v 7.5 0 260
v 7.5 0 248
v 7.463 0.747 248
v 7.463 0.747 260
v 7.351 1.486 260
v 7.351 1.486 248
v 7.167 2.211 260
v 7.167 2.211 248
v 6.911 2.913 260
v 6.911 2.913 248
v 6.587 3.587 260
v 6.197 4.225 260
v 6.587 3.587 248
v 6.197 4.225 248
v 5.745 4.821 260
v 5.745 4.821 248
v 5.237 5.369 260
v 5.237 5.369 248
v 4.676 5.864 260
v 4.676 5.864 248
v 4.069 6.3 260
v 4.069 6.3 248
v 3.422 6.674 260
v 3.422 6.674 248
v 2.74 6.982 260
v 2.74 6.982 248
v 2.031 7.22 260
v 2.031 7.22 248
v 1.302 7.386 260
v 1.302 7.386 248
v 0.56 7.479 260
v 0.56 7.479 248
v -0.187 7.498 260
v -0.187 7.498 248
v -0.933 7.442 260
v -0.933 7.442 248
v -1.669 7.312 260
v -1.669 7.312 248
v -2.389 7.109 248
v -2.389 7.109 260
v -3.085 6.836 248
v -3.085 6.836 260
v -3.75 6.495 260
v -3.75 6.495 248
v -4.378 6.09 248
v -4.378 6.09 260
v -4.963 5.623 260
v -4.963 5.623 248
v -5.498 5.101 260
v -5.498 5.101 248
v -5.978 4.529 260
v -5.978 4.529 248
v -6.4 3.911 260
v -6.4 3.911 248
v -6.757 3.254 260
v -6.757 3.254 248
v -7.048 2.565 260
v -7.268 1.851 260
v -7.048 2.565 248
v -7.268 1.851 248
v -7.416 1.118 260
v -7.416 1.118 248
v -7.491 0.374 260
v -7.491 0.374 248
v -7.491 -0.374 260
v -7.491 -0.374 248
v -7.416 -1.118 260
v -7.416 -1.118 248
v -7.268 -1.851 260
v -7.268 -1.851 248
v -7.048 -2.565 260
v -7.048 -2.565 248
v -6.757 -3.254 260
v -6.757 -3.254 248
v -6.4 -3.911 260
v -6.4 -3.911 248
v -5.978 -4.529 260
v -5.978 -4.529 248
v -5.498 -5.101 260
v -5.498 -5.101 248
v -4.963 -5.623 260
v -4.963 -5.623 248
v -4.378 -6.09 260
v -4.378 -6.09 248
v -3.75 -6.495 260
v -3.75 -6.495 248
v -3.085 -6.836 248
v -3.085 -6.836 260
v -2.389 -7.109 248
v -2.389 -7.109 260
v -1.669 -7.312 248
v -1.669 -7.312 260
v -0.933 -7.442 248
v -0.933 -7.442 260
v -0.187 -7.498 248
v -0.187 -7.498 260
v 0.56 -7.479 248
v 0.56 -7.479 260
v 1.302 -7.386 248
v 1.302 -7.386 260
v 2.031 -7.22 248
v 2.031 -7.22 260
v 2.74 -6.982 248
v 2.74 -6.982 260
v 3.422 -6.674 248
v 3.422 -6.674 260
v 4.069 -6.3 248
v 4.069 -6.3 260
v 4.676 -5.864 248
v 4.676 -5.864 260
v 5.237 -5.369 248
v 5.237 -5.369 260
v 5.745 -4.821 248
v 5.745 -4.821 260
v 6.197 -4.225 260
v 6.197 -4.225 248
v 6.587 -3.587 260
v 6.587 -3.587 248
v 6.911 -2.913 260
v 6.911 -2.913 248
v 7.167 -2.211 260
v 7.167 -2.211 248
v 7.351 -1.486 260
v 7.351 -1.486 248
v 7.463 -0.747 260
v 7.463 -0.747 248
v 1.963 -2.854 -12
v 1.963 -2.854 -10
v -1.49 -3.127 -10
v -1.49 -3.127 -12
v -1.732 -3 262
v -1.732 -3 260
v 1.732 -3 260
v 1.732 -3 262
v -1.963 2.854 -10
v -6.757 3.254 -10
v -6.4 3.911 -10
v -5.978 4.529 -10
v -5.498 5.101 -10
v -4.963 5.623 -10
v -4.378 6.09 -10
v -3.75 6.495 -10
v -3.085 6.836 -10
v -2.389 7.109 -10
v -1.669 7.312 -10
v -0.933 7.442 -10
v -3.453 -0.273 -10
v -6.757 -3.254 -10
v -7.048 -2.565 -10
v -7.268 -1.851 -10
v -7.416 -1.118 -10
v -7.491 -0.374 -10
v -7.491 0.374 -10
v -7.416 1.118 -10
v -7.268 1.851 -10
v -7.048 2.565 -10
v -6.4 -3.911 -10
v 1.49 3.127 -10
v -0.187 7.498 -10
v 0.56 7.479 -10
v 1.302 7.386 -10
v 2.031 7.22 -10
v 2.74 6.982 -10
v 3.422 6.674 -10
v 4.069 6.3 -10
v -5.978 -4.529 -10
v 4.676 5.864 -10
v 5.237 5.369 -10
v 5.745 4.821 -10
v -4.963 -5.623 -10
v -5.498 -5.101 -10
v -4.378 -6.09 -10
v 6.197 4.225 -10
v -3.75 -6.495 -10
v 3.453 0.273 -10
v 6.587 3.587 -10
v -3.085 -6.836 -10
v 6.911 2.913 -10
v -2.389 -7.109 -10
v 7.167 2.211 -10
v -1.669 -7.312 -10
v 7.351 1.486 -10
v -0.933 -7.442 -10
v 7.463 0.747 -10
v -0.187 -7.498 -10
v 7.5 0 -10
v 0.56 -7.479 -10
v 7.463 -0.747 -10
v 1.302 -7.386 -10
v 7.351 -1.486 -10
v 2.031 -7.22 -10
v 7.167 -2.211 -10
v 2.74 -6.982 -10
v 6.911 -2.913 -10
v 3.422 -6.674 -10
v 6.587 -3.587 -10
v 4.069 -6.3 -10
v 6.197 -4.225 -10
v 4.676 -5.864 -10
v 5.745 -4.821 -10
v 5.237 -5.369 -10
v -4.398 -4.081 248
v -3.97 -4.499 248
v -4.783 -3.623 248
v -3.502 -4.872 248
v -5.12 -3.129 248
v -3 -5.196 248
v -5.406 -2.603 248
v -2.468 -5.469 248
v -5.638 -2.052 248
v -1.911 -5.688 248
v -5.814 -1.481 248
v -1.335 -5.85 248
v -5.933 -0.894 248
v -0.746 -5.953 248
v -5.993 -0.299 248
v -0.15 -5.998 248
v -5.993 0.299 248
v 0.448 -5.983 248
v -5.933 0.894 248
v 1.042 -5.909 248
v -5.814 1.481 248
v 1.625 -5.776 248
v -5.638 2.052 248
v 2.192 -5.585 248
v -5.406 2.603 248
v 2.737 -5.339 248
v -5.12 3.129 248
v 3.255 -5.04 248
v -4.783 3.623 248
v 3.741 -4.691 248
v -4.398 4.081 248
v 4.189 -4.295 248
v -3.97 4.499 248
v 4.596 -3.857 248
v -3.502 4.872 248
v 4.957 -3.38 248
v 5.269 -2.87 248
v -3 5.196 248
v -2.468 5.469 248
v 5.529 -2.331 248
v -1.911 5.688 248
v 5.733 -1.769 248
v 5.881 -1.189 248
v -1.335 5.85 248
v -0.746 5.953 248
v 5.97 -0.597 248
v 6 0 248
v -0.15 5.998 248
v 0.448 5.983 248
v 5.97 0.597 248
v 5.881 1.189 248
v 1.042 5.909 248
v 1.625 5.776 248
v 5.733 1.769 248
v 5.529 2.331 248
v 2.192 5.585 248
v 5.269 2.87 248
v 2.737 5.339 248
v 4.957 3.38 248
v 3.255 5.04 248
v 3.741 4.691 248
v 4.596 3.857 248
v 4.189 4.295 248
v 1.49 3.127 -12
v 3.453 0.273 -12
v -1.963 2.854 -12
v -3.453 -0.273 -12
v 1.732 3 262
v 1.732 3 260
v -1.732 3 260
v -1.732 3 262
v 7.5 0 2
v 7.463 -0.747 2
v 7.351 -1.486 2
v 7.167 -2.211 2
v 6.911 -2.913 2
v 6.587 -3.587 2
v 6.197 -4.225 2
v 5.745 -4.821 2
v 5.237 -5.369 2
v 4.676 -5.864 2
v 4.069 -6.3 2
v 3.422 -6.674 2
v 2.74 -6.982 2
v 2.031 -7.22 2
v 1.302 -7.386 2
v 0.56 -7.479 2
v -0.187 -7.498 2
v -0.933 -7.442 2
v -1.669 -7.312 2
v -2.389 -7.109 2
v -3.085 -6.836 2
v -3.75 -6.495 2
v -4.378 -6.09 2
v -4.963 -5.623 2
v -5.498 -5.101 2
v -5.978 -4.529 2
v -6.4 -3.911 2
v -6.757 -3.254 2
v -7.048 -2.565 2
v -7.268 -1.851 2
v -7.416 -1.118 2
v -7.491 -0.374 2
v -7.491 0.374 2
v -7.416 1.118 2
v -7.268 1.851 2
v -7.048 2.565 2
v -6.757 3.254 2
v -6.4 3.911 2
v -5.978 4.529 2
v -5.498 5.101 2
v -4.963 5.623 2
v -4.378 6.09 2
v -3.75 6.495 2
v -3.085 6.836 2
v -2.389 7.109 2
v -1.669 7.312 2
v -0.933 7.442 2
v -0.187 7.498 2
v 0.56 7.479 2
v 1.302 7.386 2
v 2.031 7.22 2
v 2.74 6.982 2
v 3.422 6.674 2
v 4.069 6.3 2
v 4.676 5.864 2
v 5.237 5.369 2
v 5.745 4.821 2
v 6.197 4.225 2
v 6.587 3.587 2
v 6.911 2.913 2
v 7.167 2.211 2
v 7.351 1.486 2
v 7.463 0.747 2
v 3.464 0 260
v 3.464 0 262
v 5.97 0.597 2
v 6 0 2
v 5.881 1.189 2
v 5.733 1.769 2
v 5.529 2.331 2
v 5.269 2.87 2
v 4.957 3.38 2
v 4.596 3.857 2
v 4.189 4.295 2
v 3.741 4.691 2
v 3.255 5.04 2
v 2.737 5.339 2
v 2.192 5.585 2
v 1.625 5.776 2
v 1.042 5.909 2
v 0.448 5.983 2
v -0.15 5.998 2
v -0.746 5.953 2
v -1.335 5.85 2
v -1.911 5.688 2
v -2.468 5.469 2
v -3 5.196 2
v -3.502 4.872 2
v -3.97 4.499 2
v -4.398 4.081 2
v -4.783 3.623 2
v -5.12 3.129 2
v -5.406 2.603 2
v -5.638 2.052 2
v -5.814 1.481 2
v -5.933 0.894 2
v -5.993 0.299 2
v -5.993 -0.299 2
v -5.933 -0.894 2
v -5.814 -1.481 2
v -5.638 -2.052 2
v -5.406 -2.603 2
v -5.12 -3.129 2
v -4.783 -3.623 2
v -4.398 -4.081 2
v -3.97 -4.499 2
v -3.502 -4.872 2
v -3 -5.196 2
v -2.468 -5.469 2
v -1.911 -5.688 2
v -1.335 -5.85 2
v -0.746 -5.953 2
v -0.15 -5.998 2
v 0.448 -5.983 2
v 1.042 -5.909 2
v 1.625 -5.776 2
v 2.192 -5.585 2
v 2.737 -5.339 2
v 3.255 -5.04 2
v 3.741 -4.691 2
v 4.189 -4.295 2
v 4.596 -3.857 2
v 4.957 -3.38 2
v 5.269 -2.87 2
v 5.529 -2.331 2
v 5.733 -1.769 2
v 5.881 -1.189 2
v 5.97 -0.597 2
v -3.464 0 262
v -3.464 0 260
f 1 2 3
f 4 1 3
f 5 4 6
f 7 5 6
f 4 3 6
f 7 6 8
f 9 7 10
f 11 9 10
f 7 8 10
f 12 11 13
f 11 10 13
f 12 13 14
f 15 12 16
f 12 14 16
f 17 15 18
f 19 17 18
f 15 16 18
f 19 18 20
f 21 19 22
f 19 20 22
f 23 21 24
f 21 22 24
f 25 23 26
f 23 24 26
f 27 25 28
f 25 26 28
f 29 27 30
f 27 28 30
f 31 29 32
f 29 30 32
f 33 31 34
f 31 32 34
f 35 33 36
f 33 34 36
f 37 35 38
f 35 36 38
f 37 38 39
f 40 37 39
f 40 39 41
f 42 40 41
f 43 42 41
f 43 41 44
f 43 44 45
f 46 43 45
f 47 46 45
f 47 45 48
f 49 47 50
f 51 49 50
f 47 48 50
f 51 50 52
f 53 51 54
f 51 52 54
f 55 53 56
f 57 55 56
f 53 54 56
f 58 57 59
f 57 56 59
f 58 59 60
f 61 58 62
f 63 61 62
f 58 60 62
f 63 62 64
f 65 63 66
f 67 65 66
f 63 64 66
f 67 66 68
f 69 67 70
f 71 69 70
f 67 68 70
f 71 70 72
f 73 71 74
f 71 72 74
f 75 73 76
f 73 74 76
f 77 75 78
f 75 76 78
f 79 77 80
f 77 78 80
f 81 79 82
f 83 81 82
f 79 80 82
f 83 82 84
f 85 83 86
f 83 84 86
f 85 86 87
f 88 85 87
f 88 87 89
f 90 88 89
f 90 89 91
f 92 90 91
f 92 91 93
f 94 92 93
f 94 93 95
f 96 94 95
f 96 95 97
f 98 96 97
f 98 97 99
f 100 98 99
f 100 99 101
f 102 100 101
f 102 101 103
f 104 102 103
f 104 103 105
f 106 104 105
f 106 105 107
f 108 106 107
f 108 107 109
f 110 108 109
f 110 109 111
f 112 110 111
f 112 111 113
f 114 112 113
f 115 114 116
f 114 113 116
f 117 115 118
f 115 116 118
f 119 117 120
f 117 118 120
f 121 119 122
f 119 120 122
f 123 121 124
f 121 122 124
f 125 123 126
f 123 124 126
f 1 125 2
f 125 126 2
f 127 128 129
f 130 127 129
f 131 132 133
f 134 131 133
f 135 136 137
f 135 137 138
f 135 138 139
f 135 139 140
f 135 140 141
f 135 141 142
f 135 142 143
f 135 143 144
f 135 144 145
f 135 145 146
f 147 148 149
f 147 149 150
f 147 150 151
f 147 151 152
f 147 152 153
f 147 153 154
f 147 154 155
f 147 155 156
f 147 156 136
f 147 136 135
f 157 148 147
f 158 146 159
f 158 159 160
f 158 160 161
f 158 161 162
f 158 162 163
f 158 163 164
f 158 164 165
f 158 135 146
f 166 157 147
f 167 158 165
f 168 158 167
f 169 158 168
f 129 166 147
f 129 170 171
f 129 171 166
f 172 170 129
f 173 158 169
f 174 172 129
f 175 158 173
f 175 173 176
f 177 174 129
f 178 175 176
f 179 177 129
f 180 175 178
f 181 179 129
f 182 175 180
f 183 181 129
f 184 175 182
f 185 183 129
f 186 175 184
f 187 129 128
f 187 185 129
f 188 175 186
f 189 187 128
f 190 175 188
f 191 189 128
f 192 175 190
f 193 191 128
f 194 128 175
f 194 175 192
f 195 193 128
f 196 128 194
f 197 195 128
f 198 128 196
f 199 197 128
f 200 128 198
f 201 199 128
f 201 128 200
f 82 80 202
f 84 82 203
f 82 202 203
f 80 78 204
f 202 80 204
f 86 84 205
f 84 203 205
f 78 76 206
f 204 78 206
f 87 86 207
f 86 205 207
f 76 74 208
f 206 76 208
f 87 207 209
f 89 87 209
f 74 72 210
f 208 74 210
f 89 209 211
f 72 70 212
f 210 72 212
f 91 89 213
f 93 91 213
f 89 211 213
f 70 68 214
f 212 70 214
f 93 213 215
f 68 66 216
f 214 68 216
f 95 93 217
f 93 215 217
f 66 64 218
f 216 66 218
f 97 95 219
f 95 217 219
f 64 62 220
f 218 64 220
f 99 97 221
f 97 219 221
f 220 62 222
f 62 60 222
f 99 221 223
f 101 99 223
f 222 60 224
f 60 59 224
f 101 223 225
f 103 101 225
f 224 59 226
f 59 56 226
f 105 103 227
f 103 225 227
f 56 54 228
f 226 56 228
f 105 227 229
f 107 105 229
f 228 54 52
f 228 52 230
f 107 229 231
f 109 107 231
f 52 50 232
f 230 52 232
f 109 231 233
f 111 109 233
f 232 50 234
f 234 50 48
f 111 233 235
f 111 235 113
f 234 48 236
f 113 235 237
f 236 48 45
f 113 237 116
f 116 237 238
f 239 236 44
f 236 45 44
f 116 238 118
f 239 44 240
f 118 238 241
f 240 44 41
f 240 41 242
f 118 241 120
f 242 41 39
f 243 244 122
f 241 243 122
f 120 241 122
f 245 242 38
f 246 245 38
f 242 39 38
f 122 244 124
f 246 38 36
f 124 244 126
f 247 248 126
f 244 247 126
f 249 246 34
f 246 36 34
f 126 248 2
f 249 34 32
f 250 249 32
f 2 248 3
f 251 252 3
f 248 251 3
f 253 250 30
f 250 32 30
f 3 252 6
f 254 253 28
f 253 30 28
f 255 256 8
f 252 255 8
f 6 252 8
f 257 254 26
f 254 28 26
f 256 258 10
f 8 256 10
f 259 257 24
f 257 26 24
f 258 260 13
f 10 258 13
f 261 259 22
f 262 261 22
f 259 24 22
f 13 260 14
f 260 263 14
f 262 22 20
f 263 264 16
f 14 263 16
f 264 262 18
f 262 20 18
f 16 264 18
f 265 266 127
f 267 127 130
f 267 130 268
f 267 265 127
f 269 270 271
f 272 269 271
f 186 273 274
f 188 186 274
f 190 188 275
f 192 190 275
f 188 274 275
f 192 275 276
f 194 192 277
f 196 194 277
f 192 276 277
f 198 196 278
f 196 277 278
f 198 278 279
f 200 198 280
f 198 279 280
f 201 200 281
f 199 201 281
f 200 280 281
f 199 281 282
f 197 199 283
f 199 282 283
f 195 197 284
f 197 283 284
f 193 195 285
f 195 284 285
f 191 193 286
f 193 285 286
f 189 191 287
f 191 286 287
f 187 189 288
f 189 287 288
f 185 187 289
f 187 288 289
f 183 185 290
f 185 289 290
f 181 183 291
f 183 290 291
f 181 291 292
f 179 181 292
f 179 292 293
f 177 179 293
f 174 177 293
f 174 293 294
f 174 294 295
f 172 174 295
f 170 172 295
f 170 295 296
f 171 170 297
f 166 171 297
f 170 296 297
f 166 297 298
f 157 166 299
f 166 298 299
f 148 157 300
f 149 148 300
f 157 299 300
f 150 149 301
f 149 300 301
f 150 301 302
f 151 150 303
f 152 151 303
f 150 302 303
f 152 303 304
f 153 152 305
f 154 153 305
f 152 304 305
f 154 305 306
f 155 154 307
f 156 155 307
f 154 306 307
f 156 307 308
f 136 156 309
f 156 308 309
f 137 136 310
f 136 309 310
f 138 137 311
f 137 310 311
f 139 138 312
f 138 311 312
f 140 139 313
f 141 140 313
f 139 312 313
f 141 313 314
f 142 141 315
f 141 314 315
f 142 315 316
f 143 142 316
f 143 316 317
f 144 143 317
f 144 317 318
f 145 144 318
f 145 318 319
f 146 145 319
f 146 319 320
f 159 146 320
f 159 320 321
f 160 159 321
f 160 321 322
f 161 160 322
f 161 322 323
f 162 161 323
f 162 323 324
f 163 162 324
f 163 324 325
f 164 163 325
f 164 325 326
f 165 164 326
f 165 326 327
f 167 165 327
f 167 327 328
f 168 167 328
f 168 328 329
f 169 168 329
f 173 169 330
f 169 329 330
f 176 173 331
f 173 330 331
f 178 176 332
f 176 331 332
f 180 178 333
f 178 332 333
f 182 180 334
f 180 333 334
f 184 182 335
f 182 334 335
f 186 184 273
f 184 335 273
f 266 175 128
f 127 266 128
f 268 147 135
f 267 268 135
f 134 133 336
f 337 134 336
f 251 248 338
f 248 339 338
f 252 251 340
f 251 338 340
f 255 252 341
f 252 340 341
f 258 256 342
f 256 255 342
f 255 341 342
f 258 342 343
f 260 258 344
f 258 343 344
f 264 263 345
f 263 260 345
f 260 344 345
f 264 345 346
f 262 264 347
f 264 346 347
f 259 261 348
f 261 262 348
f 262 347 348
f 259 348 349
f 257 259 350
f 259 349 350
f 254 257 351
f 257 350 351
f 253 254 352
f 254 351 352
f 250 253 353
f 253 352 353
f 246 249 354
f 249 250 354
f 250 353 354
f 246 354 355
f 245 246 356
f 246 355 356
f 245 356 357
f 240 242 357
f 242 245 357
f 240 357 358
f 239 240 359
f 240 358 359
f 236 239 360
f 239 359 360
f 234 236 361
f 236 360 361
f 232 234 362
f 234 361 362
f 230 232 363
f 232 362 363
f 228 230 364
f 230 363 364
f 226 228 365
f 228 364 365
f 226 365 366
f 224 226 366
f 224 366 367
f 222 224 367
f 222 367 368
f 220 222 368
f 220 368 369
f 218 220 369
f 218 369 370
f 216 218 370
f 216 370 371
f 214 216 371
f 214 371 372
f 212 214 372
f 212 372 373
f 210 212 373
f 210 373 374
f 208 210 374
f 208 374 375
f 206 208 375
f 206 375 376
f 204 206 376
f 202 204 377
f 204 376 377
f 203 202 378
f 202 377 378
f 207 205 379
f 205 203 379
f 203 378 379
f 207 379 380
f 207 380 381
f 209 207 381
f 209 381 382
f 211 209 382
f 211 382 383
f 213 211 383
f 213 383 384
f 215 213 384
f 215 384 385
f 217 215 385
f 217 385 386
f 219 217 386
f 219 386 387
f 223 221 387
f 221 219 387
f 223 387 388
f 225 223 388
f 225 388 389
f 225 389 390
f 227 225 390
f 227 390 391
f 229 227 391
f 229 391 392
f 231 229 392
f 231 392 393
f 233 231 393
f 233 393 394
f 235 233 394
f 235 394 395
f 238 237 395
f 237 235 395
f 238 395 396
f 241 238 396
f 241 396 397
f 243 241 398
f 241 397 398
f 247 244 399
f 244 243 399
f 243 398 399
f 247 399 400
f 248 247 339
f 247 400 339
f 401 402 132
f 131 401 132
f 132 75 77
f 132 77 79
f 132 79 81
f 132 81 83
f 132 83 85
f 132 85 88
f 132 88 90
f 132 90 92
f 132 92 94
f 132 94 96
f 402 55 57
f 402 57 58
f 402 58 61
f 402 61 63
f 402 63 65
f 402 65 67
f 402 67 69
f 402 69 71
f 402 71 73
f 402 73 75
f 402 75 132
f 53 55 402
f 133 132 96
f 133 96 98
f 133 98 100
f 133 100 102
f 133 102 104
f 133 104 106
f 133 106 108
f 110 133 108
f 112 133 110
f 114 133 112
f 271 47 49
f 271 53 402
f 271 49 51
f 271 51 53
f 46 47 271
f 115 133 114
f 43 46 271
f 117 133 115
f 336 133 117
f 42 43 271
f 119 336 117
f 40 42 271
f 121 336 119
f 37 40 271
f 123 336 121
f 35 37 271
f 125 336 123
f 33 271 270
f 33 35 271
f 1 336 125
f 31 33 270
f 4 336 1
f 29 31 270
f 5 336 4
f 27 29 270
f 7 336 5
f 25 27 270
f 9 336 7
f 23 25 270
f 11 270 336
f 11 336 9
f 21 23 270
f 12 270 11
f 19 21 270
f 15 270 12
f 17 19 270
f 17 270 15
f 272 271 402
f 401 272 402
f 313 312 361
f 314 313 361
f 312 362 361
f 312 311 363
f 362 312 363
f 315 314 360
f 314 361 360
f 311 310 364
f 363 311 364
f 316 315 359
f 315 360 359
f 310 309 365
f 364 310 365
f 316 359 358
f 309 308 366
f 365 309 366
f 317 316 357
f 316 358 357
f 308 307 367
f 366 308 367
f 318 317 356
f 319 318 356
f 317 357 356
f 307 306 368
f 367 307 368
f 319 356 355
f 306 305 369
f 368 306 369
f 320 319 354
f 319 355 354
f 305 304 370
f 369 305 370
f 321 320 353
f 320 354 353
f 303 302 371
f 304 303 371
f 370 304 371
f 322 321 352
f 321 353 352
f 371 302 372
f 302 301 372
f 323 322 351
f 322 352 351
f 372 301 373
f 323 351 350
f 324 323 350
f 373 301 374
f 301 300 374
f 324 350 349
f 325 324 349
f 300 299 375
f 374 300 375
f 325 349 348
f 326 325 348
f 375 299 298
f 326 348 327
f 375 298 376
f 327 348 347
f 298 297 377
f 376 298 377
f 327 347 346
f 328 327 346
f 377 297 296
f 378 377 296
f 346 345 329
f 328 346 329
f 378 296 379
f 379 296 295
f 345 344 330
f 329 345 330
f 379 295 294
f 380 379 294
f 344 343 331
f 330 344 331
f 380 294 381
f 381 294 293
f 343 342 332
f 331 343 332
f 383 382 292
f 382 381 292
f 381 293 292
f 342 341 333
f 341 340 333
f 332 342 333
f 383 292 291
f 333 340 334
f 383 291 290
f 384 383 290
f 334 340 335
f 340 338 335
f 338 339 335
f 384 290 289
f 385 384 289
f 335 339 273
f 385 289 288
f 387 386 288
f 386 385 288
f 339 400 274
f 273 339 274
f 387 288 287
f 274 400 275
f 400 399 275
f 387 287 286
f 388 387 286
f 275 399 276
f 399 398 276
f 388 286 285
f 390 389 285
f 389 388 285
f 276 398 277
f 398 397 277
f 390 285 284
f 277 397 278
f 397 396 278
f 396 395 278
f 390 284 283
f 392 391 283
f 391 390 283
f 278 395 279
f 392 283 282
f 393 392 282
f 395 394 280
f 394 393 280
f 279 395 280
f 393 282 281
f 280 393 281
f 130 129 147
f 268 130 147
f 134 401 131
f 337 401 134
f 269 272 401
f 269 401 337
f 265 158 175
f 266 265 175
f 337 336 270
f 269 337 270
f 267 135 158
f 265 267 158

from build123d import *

# Parameters (mm, degrees)
CROQUIS1_R                   = 6
SALIENTE_EXTRUIR1_DEPTH      = 250
SALIENTE_EXTRUIR2_DEPTH      = 10
SALIENTE_EXTRUIR2_DEPTH_BACK = 2
CROQUIS2_R                   = 7.5
SALIENTE_EXTRUIR3_DEPTH      = 10
SALIENTE_EXTRUIR3_DEPTH_BACK = 2
CROQUIS3_R                   = 7.5
SALIENTE_EXTRUIR4_DEPTH      = 2
SALIENTE_EXTRUIR5_DEPTH      = 2


with BuildPart() as part:
    # Croquis1 → Saliente-Extruir1 (new body)
    with BuildSketch(Plane.XY):
        Circle(CROQUIS1_R)
    extrude(amount=SALIENTE_EXTRUIR1_DEPTH)

    # Croquis2 → Saliente-Extruir2 (add, two sides: drawn at the far end of the back side and taken through both)
    with BuildSketch(Plane.XY.offset(250).offset(-SALIENTE_EXTRUIR2_DEPTH_BACK)):
        Circle(CROQUIS2_R)
    extrude(amount=SALIENTE_EXTRUIR2_DEPTH + SALIENTE_EXTRUIR2_DEPTH_BACK)

    # Croquis3 → Saliente-Extruir3 (add, two sides: drawn at the far end of the back side and taken through both)
    with BuildSketch(Plane(origin=(0, 0, 0), x_dir=(-1, 0, 0), z_dir=(0, 0, -1)).offset(-SALIENTE_EXTRUIR3_DEPTH_BACK)):
        with Locations(Location((0, 0, 0), (0, 0, 180))):
            Circle(CROQUIS3_R)
    extrude(amount=SALIENTE_EXTRUIR3_DEPTH + SALIENTE_EXTRUIR3_DEPTH_BACK)

    # Croquis4 → Saliente-Extruir4 (add)
    with BuildSketch(Plane.XY.offset(260)):
        Polygon((3.464101615, 0), (1.732050808, 3), (-1.732050808, 3), (-3.464101615, 0), (-1.732050808, -3), (1.732050808, -3), align=None)
    extrude(amount=SALIENTE_EXTRUIR4_DEPTH)

    # Croquis5 → Saliente-Extruir5 (add)
    with BuildSketch(Plane(origin=(0, 0, -10), x_dir=(-1, 0, 0), z_dir=(0, 0, -1))):
        Polygon((1.963176251, 2.854109144), (-1.490142898, 3.127215078), (-3.45331915, 0.273105934), (-1.963176251, -2.854109144), (1.490142898, -3.127215078), (3.45331915, -0.273105934), align=None)
    extrude(amount=SALIENTE_EXTRUIR5_DEPTH)


solid = part.part
